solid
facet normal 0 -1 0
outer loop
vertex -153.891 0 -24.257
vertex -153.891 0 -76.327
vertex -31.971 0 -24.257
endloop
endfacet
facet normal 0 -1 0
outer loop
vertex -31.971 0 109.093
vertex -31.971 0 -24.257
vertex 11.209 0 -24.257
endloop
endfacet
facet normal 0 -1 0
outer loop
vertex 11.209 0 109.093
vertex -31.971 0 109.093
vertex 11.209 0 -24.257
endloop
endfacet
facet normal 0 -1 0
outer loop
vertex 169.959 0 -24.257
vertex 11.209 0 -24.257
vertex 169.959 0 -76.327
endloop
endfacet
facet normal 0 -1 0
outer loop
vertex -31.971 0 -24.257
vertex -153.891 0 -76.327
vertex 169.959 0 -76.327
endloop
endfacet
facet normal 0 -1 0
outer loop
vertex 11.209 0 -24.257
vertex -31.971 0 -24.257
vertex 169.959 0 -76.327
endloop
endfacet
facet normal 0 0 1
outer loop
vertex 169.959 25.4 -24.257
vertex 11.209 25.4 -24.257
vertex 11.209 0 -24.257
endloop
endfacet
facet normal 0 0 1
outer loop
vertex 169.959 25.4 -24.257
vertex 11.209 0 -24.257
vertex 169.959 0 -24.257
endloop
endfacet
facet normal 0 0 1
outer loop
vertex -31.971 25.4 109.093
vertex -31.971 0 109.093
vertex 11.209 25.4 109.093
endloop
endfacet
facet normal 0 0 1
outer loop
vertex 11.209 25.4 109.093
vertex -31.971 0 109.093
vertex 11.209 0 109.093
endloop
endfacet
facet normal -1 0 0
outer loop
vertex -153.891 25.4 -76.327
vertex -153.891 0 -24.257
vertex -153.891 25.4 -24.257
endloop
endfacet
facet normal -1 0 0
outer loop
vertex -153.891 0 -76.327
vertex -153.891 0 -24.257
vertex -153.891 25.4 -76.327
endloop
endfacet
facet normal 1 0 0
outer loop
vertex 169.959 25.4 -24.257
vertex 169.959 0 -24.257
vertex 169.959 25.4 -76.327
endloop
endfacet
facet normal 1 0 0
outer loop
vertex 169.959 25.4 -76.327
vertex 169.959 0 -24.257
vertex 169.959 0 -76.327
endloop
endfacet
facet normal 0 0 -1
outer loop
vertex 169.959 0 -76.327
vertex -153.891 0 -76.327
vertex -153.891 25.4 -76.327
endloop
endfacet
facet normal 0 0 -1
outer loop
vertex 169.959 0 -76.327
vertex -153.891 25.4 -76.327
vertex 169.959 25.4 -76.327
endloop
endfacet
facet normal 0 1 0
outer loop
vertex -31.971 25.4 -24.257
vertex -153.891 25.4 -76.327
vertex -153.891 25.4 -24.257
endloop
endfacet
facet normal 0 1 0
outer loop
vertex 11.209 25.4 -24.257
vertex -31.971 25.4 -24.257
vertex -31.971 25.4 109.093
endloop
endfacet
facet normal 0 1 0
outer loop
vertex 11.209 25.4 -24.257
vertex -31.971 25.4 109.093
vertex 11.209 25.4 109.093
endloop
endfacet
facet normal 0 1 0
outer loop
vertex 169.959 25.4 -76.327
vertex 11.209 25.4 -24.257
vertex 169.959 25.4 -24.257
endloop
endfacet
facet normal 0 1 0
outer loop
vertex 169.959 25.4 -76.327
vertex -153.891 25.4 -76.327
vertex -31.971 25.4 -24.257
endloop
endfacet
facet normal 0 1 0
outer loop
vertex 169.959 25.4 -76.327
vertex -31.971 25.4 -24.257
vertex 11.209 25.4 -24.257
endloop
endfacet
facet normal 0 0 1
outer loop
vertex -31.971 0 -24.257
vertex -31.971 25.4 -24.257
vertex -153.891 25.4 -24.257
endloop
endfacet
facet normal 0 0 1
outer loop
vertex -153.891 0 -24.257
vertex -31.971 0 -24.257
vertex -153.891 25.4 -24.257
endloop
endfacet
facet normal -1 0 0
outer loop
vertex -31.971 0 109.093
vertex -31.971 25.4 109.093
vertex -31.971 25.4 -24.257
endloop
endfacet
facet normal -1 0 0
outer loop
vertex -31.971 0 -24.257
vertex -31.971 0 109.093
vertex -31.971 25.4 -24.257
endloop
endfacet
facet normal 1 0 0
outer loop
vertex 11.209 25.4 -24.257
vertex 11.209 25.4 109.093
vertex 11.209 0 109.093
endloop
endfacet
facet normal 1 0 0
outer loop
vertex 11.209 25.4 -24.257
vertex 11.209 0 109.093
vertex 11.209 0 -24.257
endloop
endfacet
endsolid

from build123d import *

# Parameters (mm, degrees)
SKETCH2_W           = 323.85
SKETCH2_H           = 185.42
BOSS_EXTRUDE1_DEPTH = 25.4
SKETCH3_W           = 158.75
SKETCH3_H           = 133.35
CUT_EXTRUDE2_DEPTH  = 25.4


with BuildPart() as part:
    # Sketch2 → Boss-Extrude1 (new body)
    with BuildSketch(Plane(origin=(0, 0, 0), x_dir=(1, 0, 0), z_dir=(0, 1, 0))):
        with Locations((8.034446565, -16.382757634)):
            Rectangle(SKETCH2_W, SKETCH2_H)
    extrude(amount=BOSS_EXTRUDE1_DEPTH)

    # Sketch3 → Cut-Extrude2 (cut)
    with BuildSketch(Plane(origin=(0, 25.4, 0), x_dir=(1, 0, 0), z_dir=(0, 1, 0))):
        Polygon((-153.890553435, 24.257242366), (-153.890553435, -12.50606057), (-153.890553435, -109.092757634), (-31.970553435, -109.092757634), (-31.970553435, 24.257242366), align=None)
        with Locations((90.584446565, -42.417757634)):
            Rectangle(SKETCH3_W, SKETCH3_H)
    extrude(amount=-CUT_EXTRUDE2_DEPTH, mode=Mode.SUBTRACT)


solid = part.part
